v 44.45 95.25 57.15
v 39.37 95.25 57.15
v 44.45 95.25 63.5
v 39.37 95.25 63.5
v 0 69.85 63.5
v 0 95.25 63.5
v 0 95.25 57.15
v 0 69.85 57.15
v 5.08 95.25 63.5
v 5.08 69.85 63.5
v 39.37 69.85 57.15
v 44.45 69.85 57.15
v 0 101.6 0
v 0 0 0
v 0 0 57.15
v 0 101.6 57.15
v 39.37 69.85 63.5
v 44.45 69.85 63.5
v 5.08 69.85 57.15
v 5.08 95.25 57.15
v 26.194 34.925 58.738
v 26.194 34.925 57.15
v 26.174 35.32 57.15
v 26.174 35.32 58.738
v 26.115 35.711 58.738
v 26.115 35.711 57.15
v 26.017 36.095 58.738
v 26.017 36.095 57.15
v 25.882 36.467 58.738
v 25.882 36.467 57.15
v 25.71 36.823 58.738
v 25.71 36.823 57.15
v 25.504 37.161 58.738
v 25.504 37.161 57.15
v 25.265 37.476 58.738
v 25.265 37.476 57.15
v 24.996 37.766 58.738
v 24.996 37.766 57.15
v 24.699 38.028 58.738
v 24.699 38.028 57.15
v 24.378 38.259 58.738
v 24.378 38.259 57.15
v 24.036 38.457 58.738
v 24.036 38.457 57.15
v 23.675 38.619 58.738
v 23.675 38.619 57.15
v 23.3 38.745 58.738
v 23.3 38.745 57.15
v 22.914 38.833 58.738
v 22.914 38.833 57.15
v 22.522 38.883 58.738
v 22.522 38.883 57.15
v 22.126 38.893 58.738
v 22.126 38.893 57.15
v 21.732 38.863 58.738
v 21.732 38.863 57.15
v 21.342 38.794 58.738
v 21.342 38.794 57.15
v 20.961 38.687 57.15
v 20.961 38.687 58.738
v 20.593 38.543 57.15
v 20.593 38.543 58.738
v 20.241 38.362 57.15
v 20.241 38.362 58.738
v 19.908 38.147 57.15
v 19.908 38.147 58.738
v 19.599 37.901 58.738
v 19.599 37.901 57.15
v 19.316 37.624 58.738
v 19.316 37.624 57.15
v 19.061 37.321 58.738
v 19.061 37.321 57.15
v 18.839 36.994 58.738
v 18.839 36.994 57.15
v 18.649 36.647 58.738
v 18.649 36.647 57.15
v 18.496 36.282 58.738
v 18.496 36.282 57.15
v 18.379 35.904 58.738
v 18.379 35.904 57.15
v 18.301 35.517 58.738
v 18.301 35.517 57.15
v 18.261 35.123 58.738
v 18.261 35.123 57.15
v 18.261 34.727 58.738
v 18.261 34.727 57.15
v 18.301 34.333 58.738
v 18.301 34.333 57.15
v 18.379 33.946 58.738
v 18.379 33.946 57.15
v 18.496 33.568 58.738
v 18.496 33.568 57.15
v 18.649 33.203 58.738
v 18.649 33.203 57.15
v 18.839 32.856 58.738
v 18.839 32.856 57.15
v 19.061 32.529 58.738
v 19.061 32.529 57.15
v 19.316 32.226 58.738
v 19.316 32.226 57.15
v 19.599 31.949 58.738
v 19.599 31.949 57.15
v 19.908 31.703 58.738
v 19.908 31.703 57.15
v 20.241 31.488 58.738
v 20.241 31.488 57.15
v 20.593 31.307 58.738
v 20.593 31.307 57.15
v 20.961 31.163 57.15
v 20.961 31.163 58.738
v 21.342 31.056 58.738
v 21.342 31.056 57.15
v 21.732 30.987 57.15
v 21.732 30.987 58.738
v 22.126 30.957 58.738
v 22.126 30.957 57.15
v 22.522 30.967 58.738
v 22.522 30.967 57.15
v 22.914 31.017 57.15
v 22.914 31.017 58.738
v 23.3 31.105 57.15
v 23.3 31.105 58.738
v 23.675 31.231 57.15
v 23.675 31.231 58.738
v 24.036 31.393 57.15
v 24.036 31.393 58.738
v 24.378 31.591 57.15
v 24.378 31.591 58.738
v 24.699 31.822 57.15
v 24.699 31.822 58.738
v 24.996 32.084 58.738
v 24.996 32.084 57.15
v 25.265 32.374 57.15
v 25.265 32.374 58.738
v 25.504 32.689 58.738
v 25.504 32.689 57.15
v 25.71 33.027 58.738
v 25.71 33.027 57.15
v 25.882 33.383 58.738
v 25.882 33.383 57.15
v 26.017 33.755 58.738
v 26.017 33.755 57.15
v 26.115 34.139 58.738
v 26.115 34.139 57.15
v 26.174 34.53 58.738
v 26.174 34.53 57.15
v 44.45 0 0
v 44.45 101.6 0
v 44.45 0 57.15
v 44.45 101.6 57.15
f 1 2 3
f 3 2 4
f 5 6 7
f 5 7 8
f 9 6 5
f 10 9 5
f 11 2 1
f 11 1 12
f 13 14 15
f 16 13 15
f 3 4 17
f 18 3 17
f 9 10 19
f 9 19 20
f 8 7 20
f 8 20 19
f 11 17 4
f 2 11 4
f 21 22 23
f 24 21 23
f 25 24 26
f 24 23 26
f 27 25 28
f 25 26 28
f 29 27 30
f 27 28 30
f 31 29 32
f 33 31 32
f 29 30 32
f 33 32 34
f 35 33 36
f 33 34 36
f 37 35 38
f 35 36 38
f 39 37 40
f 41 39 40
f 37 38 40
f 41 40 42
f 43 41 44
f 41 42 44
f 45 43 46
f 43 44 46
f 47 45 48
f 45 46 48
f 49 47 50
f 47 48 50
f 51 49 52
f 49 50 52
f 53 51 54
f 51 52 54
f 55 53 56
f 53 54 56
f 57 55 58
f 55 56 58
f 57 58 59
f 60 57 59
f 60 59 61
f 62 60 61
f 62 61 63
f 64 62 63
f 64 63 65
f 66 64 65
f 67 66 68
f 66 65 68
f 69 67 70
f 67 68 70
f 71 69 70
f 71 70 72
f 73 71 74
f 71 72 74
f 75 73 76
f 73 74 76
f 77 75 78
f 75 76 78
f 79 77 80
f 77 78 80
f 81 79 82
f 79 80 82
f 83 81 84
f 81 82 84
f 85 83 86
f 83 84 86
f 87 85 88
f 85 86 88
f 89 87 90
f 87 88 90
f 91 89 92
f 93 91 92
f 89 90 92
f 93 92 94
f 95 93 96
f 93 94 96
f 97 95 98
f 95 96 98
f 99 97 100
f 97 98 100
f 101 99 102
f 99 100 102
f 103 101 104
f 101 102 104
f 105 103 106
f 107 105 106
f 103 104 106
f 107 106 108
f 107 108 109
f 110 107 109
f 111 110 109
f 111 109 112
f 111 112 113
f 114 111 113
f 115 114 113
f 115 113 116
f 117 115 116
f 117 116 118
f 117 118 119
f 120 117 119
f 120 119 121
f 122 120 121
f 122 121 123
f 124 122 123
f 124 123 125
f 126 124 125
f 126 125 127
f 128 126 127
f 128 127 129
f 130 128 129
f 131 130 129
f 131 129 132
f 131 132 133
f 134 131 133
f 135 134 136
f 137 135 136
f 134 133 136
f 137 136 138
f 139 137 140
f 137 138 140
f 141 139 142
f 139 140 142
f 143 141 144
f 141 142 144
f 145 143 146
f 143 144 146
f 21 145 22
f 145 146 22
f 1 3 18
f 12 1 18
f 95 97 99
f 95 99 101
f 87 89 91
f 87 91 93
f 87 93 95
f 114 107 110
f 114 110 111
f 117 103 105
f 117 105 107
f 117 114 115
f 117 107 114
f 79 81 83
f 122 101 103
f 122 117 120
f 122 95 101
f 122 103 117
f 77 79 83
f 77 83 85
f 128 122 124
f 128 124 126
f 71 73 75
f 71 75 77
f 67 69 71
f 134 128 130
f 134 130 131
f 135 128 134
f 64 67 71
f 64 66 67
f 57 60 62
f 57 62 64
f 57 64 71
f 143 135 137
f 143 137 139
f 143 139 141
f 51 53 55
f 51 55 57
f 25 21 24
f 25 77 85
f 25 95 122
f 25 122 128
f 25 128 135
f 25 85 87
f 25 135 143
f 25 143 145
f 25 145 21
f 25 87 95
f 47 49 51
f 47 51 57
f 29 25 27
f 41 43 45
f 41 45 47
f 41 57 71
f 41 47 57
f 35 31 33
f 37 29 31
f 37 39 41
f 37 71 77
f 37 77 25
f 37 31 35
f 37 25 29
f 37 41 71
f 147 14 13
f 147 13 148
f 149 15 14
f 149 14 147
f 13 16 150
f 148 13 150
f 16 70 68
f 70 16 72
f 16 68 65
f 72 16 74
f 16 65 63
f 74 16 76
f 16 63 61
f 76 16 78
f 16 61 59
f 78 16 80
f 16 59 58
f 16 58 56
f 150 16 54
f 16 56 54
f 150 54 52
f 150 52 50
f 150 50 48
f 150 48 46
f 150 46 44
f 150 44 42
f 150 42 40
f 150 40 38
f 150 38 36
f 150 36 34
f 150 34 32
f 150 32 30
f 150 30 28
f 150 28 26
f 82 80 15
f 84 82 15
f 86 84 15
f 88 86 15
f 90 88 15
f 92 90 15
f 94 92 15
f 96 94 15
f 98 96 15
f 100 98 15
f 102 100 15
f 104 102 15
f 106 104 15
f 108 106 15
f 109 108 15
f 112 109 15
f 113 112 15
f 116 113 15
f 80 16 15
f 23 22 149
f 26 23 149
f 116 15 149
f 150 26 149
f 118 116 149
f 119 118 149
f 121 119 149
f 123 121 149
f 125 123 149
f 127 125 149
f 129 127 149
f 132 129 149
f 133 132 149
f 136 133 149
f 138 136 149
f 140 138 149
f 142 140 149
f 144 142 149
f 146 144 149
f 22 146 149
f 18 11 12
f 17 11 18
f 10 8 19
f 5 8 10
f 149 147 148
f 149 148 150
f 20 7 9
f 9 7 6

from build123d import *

# Parameters (mm, degrees)
F0_W     = 44.45
F0_H     = 57.15
F1_DEPTH = 101.6
F2_W     = 25.4
F2_H     = 6.35
F3_DEPTH = 44.45
F4_W     = 34.29
F4_H     = 25.4
F5_DEPTH = 6.35
F6_R     = 3.96875
F7_DEPTH = 1.5875
F8_DEPTH = 6.35


with BuildPart() as f1:
    # F0 (on Front) → F1 (new body)
    with BuildSketch(Plane.XZ):
        with Locations((22.225, 28.575)):
            Rectangle(F0_W, F0_H)
    extrude(amount=-F1_DEPTH)

    # F6 (on face) → F7 (join)
    with BuildSketch(Plane.XY.offset(57.15)):
        with Locations((22.225, 34.925)):
            Circle(F6_R)
    extrude(amount=F7_DEPTH)

    # F4 (on face) → F8 (cut)
    with BuildSketch(Plane.XY.offset(63.5)):
        with Locations((22.225, 82.55)):
            Rectangle(F4_W, F4_H)
    extrude(amount=-F8_DEPTH, mode=Mode.SUBTRACT)


with BuildPart() as f3:
    # F2 (on face) → F3 (new body)
    with BuildSketch(Plane(origin=(0, 0, 0), x_dir=(0, -1, 0), z_dir=(-1, 0, 0))):
        with Locations((-82.55, 60.325)):
            Rectangle(F2_W, F2_H)
    extrude(amount=-F3_DEPTH)

    # F4 (on face) → F5 (cut)
    with BuildSketch(Plane.XY.offset(63.5)):
        with Locations((22.225, 82.55)):
            Rectangle(F4_W, F4_H)
    extrude(amount=-F5_DEPTH, mode=Mode.SUBTRACT)


solid = Compound([f1.part, f3.part])
